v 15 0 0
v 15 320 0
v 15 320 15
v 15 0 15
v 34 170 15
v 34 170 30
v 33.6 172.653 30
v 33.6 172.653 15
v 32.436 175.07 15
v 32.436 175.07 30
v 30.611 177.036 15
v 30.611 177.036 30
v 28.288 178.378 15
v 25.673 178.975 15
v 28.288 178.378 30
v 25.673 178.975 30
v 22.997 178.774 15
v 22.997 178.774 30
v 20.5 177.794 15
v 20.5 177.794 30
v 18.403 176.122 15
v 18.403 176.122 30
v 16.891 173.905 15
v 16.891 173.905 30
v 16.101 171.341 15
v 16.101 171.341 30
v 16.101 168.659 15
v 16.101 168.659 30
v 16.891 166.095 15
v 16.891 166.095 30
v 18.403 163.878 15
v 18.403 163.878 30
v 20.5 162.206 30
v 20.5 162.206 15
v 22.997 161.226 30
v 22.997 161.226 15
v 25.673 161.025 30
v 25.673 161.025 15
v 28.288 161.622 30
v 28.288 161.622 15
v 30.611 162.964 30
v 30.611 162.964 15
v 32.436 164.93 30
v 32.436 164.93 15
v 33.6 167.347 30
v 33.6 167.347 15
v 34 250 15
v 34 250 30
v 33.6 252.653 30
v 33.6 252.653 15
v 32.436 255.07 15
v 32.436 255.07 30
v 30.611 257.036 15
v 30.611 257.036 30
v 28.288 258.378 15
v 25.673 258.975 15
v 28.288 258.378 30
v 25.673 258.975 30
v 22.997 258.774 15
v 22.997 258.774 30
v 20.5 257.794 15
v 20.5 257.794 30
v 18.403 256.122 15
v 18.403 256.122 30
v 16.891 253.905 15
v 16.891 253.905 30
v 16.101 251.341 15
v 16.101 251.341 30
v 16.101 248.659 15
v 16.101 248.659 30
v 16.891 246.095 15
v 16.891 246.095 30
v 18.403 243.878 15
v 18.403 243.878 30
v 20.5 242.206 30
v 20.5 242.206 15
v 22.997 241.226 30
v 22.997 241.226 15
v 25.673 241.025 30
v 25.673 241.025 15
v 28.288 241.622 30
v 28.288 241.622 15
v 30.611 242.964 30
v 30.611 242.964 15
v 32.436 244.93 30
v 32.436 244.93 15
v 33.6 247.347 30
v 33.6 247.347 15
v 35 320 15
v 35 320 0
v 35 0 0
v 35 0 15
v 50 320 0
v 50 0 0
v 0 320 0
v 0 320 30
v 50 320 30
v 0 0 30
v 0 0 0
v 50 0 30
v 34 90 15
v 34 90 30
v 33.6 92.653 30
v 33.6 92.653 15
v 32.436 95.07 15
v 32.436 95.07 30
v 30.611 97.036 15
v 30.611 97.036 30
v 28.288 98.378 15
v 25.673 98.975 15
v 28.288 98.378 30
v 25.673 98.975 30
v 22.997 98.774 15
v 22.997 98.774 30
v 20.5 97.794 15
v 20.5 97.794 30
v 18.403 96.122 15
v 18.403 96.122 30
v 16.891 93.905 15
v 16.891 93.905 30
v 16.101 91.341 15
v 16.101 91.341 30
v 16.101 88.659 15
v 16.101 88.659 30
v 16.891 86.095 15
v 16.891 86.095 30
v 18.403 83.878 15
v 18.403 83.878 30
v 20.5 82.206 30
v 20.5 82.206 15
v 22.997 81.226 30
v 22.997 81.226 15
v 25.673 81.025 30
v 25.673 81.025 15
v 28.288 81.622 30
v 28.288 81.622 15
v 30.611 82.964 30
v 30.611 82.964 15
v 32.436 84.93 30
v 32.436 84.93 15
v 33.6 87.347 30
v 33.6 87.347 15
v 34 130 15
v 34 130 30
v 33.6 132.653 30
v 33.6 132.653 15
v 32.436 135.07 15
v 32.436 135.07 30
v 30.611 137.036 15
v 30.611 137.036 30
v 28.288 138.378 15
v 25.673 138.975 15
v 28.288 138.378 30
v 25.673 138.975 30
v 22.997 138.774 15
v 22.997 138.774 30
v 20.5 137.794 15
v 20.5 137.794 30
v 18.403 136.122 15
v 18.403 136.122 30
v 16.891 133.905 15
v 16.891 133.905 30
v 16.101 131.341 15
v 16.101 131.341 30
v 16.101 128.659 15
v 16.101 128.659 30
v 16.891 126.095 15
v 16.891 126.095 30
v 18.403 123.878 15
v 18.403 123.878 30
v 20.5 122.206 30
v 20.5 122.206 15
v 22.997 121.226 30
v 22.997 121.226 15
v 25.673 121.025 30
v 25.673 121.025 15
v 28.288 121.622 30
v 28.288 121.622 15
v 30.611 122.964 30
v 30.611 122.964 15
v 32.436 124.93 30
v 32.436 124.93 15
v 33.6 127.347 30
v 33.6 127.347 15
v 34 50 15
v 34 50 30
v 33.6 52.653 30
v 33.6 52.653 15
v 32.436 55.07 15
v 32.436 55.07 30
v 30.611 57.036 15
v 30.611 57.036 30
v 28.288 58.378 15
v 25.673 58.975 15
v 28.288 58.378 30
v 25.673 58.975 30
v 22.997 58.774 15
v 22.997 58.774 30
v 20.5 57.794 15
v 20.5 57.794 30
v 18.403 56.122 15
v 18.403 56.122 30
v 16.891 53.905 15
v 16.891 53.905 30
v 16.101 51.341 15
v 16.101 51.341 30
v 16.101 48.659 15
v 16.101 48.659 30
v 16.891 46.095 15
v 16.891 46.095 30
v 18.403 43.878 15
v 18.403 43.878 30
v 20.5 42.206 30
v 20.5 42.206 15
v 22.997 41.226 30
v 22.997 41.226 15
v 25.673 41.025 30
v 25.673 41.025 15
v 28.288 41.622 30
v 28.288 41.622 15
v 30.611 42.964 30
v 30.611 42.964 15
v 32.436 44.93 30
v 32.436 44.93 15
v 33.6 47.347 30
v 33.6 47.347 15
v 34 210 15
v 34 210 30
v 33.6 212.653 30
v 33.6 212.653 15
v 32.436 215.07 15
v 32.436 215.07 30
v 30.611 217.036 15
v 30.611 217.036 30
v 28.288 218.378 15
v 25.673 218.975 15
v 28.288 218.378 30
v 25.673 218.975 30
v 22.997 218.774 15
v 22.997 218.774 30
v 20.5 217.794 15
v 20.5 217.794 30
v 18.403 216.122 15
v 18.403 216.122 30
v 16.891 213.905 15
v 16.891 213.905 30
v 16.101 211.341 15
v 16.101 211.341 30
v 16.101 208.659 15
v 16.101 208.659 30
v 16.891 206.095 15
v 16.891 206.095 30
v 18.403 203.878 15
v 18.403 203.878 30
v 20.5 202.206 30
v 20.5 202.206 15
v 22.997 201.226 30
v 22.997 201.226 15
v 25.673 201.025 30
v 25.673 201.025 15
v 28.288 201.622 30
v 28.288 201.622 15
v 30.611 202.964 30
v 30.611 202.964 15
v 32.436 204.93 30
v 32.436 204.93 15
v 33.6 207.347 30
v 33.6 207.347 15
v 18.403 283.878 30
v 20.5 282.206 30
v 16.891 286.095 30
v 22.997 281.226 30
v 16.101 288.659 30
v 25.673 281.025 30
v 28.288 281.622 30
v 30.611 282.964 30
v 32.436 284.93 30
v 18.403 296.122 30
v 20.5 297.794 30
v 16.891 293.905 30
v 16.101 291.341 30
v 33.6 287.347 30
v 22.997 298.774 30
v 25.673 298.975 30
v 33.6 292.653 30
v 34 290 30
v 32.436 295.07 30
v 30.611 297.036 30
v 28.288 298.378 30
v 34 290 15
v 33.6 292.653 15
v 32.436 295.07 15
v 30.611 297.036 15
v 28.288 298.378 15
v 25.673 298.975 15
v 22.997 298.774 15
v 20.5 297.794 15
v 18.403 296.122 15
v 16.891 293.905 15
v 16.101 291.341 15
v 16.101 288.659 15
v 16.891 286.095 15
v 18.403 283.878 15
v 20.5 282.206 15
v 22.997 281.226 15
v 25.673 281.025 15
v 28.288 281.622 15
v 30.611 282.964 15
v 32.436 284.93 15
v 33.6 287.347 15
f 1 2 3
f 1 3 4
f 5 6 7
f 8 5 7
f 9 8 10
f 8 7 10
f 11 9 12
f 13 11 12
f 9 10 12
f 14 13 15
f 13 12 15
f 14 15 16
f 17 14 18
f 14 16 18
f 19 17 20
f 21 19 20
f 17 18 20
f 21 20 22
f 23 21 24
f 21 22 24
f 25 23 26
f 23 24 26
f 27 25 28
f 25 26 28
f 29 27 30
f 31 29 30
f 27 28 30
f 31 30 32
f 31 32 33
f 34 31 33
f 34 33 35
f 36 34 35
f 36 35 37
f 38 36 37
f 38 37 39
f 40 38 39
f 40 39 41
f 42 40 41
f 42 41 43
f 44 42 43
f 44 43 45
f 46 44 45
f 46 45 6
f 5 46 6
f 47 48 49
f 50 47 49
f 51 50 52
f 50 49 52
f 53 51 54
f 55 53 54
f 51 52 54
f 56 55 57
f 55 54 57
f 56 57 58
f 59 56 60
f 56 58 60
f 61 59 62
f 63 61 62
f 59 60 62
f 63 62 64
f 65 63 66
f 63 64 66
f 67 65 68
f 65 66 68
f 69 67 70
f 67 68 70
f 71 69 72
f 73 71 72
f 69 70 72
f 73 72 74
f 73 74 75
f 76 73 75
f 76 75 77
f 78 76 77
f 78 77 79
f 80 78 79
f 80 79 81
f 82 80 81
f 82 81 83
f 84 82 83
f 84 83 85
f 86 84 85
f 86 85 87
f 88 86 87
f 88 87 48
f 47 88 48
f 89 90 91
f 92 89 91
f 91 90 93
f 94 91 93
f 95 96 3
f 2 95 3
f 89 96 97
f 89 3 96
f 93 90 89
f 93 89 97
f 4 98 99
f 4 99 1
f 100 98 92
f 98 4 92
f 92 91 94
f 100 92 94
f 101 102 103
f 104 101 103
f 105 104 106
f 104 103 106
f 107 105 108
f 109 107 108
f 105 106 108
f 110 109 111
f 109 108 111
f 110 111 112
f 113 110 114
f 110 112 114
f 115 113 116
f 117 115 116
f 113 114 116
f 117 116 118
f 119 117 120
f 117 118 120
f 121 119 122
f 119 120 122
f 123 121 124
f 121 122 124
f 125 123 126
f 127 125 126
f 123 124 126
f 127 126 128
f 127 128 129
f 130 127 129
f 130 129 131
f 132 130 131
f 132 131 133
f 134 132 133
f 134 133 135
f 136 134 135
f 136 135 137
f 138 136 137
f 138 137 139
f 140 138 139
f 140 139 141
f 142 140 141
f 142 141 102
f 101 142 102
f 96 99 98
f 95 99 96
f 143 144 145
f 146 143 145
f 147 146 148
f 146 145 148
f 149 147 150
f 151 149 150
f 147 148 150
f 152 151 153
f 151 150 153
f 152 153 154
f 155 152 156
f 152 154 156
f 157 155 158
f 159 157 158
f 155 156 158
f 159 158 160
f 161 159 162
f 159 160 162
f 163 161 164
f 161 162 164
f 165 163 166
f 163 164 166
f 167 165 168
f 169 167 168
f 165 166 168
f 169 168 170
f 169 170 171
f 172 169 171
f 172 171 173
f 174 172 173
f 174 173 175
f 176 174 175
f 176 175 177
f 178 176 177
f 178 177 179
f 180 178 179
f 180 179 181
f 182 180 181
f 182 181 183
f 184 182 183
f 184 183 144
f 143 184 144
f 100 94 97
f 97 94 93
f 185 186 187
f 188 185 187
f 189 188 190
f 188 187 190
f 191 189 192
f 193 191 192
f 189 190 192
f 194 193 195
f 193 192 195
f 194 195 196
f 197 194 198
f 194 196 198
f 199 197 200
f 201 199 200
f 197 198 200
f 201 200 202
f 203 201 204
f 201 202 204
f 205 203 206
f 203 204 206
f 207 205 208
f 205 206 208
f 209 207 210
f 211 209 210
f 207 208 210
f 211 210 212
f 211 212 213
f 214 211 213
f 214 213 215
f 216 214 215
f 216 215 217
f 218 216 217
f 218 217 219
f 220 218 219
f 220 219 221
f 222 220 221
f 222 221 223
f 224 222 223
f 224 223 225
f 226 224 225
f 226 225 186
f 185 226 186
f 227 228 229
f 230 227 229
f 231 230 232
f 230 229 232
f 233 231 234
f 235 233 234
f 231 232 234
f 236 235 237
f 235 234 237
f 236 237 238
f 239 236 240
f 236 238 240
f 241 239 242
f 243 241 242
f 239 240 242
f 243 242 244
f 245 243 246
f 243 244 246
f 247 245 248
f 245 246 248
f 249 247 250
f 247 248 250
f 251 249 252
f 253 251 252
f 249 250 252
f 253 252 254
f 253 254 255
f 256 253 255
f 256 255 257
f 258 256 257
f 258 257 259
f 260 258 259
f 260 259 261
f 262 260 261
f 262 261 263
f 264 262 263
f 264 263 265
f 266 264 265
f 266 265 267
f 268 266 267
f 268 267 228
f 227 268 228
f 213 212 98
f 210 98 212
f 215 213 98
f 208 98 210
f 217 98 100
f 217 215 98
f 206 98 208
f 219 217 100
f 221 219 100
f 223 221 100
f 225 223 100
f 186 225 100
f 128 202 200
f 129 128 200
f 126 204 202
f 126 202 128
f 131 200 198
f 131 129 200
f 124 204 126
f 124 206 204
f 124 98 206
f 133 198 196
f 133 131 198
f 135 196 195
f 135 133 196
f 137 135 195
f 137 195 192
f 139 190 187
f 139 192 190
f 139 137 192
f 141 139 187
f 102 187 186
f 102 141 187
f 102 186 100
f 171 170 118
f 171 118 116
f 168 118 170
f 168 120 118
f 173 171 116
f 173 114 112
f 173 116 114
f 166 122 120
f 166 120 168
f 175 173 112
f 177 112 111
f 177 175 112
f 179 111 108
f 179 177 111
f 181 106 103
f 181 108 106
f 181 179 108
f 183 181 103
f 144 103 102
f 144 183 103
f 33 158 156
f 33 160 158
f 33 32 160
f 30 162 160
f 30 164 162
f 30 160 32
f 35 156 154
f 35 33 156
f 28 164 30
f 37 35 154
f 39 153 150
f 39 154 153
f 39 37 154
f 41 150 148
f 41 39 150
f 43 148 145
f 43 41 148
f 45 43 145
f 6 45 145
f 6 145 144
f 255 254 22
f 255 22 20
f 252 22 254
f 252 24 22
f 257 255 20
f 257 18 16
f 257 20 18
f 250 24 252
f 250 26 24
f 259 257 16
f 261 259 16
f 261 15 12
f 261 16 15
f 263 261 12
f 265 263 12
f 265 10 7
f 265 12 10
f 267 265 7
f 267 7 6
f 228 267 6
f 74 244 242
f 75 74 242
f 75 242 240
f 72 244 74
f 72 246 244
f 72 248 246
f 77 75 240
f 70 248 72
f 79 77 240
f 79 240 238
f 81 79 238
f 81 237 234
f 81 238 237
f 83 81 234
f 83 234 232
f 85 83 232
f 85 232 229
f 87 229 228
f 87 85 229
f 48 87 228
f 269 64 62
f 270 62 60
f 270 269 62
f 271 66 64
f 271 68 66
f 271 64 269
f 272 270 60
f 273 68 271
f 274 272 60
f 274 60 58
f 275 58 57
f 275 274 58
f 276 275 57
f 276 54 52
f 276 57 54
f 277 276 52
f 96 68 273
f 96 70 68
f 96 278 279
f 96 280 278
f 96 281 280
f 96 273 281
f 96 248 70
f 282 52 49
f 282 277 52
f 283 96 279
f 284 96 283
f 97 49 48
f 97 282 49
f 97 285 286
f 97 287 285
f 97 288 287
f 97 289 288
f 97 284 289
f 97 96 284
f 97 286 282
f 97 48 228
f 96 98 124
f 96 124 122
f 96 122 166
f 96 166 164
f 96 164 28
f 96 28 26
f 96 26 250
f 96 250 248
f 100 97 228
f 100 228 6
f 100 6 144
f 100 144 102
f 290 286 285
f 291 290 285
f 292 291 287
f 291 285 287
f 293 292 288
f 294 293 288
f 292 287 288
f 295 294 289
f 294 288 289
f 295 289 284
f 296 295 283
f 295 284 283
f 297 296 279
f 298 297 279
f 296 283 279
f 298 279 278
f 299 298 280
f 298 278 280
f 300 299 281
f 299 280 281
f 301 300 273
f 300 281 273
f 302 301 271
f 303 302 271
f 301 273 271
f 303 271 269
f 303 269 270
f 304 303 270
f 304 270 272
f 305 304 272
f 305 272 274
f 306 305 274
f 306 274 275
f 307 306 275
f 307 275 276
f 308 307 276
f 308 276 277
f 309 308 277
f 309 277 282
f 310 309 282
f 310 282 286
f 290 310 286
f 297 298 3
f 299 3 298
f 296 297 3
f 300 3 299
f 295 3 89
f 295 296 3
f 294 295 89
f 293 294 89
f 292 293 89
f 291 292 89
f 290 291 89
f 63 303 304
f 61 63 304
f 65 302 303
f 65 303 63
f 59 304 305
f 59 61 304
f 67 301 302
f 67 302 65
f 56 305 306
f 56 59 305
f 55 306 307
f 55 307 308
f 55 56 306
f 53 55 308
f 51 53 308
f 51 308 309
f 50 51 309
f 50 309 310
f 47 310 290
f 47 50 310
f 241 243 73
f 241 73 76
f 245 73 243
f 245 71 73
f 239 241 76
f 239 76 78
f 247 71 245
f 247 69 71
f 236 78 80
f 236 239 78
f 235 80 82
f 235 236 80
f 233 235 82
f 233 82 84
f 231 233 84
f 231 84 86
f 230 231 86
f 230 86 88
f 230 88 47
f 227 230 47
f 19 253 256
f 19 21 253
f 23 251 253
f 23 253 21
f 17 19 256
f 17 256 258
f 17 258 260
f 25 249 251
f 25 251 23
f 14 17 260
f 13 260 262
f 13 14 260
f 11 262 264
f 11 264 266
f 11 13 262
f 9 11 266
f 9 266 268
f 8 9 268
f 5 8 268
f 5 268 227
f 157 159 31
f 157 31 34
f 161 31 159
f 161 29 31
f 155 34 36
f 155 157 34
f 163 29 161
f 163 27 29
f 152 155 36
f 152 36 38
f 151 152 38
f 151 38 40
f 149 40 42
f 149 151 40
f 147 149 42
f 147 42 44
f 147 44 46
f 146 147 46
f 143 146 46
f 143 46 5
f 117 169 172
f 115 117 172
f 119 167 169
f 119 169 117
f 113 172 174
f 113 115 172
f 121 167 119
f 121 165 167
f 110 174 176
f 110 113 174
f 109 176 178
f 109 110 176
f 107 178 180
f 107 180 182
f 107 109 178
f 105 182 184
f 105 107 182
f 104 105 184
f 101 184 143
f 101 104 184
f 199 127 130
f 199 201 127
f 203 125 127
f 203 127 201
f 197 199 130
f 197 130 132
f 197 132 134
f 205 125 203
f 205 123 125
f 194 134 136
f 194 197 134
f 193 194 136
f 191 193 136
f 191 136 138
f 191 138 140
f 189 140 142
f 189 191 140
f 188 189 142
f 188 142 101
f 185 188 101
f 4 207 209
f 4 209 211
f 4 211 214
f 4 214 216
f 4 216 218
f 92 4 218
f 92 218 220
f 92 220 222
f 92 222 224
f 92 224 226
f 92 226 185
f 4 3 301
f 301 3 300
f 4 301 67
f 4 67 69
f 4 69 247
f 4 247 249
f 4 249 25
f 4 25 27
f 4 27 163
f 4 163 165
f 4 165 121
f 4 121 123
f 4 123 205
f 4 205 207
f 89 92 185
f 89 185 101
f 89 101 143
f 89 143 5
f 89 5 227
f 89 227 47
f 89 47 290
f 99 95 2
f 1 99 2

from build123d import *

# Parameters (mm, degrees)
F0_W     = 50
F0_H     = 320
F1_DEPTH = 30
F2_W     = 20
F2_H     = 320
F3_DEPTH = 15
F4_R     = 9
F5_DEPTH = 30.001


with BuildPart() as f1:
    # F0 (on Top) → F1 (new body)
    with BuildSketch(Plane.XY):
        with Locations((25, 160)):
            Rectangle(F0_W, F0_H)
    extrude(amount=F1_DEPTH)

    # F2 (on face) → F3 (cut)
    with BuildSketch(Plane(origin=(0, 0, 0), x_dir=(1, 0, 0), z_dir=(0, 0, -1))):
        with Locations((25, -160)):
            Rectangle(F2_W, F2_H)
    extrude(amount=-F3_DEPTH, mode=Mode.SUBTRACT)

    # F4 (on face) → F5 (cut, through all)
    with BuildSketch(Plane.XY.offset(30)):
        with Locations((25, 50)):
            Circle(F4_R)
        with Locations((25, 90)):
            Circle(F4_R)
        with Locations((25, 130)):
            Circle(F4_R)
        with Locations((25, 170)):
            Circle(F4_R)
        with Locations((25, 210)):
            Circle(F4_R)
        with Locations((25, 250)):
            Circle(F4_R)
        with Locations((25, 290)):
            Circle(F4_R)
    extrude(amount=-F5_DEPTH, mode=Mode.SUBTRACT)


solid = f1.part
